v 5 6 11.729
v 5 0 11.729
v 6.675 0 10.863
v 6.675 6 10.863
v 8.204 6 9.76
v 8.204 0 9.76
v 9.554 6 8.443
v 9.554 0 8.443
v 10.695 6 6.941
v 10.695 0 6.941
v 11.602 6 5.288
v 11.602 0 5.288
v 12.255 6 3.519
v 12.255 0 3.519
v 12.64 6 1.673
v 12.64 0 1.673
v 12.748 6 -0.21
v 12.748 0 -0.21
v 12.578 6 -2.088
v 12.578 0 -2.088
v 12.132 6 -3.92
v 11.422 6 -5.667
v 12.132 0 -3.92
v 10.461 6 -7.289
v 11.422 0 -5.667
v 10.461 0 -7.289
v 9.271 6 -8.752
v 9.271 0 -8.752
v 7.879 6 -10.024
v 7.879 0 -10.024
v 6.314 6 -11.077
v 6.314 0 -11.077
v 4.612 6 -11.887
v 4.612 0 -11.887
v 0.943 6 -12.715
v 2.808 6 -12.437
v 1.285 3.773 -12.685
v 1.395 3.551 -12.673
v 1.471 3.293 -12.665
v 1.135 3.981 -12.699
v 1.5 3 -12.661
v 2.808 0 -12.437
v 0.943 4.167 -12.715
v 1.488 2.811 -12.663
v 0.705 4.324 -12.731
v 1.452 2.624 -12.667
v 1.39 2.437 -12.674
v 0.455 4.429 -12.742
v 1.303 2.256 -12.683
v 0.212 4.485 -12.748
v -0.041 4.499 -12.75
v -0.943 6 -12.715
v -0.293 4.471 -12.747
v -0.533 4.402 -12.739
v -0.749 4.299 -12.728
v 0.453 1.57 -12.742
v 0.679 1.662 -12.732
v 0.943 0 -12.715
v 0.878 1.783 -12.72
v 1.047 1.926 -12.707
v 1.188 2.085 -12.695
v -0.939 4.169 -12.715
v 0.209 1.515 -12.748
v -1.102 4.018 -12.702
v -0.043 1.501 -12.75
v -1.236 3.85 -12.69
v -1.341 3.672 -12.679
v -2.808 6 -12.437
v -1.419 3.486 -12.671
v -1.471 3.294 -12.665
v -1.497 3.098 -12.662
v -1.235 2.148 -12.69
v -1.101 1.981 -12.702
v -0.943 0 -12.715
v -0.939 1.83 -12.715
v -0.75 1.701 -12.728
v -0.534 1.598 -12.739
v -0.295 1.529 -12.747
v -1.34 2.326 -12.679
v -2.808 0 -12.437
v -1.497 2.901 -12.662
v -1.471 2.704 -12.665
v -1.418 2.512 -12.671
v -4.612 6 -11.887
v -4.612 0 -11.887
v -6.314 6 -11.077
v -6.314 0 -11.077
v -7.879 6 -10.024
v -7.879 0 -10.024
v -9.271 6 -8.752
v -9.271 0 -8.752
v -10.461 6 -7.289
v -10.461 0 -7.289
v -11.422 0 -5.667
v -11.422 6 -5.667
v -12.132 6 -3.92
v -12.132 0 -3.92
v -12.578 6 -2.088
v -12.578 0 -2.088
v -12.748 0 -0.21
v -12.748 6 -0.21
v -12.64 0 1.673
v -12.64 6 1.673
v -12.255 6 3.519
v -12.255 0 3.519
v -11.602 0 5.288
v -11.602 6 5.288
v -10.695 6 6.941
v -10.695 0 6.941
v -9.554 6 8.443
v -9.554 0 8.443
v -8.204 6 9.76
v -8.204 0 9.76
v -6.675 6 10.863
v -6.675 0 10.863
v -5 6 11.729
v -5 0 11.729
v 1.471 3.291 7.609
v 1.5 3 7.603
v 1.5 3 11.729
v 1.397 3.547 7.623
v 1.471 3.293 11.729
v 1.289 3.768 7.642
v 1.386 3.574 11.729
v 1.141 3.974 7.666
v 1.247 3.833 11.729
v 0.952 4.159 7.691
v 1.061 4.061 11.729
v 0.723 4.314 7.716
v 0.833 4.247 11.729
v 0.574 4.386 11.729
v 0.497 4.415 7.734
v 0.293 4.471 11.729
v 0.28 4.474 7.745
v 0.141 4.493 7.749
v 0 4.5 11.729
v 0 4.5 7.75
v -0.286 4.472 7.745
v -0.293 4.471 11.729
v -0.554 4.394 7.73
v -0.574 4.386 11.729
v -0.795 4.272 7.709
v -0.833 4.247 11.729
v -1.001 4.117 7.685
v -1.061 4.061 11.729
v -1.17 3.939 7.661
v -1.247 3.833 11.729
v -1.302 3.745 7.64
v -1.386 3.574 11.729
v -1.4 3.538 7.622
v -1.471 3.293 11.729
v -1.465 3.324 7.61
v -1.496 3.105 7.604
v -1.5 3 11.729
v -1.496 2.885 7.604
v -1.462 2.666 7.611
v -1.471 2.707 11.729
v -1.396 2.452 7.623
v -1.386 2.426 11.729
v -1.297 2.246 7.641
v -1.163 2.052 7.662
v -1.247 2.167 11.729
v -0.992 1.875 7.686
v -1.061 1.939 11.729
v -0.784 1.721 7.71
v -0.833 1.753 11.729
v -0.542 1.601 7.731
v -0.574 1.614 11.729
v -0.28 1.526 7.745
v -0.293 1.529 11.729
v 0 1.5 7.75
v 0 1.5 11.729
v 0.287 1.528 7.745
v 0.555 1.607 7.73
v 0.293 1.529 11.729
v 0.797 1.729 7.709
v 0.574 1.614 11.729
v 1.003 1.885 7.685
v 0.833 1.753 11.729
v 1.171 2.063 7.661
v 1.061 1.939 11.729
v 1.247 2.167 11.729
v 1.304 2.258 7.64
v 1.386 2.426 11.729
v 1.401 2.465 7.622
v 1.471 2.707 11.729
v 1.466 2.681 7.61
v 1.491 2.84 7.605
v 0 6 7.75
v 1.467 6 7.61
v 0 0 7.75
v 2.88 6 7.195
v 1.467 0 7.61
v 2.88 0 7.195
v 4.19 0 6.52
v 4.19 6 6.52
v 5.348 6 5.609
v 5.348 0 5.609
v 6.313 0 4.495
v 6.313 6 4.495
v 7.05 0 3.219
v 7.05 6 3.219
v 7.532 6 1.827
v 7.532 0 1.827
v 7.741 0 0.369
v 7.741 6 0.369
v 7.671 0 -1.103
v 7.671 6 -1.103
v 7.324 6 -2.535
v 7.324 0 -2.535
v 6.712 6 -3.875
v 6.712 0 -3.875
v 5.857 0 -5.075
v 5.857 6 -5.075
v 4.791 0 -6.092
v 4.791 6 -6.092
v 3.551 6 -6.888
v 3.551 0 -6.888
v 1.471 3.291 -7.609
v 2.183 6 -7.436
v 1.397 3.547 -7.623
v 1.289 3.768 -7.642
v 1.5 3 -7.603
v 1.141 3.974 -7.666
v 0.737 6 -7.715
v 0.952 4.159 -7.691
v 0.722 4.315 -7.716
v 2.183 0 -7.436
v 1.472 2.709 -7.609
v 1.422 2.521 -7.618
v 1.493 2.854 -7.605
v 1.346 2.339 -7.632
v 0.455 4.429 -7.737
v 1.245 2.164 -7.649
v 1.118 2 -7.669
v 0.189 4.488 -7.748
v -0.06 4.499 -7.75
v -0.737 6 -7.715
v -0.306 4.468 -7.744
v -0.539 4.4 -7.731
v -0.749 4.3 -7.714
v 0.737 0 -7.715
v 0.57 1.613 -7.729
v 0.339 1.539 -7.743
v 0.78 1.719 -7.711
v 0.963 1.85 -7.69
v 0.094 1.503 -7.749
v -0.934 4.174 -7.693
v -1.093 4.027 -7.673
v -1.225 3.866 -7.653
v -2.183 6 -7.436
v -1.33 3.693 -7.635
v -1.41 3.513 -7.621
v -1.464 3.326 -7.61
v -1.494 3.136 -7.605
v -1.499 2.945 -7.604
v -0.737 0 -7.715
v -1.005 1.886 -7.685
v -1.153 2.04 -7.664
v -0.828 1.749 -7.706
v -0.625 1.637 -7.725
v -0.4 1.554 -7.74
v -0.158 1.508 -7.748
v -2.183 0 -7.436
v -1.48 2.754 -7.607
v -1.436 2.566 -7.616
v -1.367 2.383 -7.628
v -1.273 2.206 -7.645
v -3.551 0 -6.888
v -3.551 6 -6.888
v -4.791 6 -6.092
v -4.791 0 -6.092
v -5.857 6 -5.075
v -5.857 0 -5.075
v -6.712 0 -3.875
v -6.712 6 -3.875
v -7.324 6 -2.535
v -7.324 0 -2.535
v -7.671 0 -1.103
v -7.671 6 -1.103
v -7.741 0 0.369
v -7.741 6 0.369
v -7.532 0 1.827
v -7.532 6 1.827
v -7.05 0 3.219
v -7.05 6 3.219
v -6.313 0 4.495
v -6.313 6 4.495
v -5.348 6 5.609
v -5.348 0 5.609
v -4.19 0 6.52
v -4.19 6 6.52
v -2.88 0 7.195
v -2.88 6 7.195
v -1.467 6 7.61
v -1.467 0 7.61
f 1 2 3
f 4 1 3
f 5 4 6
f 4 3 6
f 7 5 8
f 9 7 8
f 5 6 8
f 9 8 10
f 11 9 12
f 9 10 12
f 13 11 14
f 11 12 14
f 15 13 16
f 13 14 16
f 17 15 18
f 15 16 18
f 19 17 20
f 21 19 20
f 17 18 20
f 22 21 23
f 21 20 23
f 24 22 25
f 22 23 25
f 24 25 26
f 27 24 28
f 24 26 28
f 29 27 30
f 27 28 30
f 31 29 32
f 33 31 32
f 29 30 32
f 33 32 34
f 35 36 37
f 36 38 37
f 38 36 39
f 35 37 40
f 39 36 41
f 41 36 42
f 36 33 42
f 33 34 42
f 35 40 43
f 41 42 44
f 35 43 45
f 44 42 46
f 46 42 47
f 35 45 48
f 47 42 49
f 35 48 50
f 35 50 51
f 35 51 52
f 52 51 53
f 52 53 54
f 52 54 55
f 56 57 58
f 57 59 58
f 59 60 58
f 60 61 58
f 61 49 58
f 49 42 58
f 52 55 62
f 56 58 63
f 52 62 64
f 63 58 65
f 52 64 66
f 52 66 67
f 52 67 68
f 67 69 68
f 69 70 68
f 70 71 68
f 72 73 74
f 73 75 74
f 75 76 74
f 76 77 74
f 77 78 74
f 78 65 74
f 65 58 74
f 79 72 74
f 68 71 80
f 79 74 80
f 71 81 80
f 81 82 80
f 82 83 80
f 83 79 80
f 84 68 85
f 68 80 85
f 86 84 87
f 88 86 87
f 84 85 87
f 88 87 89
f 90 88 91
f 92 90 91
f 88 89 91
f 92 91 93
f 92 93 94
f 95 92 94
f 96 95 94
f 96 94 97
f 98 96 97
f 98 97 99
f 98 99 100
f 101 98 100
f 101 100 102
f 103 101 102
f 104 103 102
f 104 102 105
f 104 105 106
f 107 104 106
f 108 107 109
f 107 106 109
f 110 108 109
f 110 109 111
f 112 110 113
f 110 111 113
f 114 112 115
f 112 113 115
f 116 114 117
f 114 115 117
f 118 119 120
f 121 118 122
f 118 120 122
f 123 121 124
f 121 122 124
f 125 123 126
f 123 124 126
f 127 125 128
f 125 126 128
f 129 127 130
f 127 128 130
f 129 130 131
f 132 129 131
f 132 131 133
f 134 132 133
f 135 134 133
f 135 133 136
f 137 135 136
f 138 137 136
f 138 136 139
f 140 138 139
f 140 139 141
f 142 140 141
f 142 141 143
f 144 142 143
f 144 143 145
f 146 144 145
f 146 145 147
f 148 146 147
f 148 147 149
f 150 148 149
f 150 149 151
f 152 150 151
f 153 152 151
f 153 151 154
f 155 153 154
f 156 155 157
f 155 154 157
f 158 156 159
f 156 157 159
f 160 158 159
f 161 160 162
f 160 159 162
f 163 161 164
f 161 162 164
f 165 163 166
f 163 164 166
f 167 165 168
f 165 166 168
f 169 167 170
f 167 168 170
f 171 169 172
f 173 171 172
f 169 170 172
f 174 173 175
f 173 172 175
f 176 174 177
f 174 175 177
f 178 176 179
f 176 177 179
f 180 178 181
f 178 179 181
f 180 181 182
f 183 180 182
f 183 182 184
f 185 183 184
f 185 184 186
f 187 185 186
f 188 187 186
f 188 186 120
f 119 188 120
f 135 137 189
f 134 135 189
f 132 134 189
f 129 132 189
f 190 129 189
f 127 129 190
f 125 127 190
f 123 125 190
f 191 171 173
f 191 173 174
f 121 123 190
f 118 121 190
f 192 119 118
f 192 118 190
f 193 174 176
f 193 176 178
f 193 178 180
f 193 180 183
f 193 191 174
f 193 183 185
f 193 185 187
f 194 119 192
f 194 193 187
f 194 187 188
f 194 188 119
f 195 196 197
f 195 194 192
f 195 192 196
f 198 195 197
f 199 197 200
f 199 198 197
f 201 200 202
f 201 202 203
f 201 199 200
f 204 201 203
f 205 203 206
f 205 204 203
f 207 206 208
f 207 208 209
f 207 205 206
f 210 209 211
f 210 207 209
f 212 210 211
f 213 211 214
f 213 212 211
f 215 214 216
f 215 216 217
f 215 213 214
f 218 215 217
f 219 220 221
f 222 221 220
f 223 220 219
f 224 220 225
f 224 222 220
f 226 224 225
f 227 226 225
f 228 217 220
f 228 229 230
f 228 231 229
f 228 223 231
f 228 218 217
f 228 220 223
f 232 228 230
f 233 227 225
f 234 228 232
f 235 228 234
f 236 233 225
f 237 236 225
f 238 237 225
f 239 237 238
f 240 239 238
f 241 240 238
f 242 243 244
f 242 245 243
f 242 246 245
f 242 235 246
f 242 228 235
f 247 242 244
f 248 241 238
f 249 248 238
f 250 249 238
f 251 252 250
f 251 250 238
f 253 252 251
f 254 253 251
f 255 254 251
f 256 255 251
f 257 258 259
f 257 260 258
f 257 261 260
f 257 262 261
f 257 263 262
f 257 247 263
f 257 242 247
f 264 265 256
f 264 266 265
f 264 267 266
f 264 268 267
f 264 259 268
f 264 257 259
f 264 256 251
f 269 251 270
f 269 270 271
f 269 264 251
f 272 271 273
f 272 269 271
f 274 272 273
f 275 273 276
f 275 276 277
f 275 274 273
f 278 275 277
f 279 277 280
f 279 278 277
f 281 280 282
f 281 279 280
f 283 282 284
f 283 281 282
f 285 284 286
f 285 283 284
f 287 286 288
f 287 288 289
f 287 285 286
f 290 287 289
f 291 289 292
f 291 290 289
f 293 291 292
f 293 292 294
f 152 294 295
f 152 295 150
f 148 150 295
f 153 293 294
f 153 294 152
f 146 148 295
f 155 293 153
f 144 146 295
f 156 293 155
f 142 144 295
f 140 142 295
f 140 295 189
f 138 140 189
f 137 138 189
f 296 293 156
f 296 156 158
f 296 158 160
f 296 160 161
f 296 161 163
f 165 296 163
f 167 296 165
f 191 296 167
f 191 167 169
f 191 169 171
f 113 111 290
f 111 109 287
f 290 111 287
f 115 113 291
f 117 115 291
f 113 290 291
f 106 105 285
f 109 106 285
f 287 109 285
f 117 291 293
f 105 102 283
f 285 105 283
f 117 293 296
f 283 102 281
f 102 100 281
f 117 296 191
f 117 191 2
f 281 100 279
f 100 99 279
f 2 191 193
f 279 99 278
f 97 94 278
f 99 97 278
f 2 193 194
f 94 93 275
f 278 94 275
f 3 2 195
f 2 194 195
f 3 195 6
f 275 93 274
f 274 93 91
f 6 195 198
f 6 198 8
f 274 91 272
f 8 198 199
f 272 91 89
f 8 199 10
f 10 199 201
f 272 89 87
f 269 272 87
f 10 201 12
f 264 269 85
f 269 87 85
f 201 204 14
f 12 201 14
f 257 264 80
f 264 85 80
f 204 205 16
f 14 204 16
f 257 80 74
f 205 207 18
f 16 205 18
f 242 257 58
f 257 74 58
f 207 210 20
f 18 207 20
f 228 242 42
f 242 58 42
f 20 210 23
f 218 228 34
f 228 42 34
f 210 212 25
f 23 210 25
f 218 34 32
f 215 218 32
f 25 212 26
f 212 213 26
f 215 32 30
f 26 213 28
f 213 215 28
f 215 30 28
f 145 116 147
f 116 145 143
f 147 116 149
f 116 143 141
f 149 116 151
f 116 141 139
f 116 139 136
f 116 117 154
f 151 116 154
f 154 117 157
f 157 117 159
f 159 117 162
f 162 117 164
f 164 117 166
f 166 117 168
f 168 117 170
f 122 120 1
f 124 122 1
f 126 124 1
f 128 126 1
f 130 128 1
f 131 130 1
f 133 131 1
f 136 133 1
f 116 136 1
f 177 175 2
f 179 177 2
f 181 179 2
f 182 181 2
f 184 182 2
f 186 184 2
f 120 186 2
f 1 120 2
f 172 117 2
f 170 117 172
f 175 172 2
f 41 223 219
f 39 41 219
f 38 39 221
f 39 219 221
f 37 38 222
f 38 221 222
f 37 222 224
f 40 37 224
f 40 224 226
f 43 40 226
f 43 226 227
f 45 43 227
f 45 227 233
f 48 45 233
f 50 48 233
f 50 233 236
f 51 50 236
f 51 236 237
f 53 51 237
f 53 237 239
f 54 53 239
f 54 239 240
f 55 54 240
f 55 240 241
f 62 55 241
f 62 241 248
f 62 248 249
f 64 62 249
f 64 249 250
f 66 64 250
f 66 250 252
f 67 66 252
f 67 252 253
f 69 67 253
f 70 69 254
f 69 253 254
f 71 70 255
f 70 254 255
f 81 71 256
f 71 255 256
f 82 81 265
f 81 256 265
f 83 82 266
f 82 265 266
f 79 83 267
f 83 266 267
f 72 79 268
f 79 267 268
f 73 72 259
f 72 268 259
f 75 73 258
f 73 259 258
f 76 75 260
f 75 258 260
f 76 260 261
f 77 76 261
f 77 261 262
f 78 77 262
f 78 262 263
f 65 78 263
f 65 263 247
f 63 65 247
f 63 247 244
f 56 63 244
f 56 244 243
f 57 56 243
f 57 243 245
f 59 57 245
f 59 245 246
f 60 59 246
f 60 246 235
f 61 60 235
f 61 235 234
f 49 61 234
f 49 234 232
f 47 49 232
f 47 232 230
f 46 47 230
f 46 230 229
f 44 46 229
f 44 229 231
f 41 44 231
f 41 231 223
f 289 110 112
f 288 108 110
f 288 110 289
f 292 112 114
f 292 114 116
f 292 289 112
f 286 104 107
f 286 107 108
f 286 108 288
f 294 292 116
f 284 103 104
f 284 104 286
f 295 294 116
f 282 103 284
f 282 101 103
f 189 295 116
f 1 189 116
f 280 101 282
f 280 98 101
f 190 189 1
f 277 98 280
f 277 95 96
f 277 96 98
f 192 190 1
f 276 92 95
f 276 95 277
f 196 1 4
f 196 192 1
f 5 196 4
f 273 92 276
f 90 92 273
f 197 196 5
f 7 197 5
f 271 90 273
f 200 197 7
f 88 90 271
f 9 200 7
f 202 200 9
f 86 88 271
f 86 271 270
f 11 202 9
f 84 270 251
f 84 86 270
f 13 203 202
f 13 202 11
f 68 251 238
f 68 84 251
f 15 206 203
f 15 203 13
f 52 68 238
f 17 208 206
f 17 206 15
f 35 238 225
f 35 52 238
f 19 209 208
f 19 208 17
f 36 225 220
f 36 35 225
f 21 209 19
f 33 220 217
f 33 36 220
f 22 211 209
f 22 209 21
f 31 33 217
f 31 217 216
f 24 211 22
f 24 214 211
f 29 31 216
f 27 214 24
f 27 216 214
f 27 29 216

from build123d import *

# Parameters (mm, degrees)
SKETCH1_R           = 7.75
BOSS_EXTRUDE1_DEPTH = 6
SKETCH2_R           = 1.5
CUT_EXTRUDE1_DEPTH  = 29.244812881


with BuildPart() as part:
    # Sketch1 → Boss-Extrude1 (new body)
    with BuildSketch(Plane(origin=(0, 0, 0), x_dir=(1, 0, 0), z_dir=(0, 1, 0))):
        with BuildLine():
            Line((-5, -11.728704106), (5, -11.728704106))
            ThreePointArc((5, -11.728704106), (0, 12.75), (-5, -11.728704106))
        make_face()
        with Locations(Location((0, 0, 0), (0, 0, 270))):
            Circle(SKETCH1_R, mode=Mode.SUBTRACT)
    extrude(amount=BOSS_EXTRUDE1_DEPTH)

    # Sketch2 → Cut-Extrude1 (cut, through all)
    with BuildSketch(Plane.XY.offset(11.728704106)):
        with Locations((0, 3)):
            Circle(SKETCH2_R)
    extrude(amount=-CUT_EXTRUDE1_DEPTH, mode=Mode.SUBTRACT)


solid = part.part
